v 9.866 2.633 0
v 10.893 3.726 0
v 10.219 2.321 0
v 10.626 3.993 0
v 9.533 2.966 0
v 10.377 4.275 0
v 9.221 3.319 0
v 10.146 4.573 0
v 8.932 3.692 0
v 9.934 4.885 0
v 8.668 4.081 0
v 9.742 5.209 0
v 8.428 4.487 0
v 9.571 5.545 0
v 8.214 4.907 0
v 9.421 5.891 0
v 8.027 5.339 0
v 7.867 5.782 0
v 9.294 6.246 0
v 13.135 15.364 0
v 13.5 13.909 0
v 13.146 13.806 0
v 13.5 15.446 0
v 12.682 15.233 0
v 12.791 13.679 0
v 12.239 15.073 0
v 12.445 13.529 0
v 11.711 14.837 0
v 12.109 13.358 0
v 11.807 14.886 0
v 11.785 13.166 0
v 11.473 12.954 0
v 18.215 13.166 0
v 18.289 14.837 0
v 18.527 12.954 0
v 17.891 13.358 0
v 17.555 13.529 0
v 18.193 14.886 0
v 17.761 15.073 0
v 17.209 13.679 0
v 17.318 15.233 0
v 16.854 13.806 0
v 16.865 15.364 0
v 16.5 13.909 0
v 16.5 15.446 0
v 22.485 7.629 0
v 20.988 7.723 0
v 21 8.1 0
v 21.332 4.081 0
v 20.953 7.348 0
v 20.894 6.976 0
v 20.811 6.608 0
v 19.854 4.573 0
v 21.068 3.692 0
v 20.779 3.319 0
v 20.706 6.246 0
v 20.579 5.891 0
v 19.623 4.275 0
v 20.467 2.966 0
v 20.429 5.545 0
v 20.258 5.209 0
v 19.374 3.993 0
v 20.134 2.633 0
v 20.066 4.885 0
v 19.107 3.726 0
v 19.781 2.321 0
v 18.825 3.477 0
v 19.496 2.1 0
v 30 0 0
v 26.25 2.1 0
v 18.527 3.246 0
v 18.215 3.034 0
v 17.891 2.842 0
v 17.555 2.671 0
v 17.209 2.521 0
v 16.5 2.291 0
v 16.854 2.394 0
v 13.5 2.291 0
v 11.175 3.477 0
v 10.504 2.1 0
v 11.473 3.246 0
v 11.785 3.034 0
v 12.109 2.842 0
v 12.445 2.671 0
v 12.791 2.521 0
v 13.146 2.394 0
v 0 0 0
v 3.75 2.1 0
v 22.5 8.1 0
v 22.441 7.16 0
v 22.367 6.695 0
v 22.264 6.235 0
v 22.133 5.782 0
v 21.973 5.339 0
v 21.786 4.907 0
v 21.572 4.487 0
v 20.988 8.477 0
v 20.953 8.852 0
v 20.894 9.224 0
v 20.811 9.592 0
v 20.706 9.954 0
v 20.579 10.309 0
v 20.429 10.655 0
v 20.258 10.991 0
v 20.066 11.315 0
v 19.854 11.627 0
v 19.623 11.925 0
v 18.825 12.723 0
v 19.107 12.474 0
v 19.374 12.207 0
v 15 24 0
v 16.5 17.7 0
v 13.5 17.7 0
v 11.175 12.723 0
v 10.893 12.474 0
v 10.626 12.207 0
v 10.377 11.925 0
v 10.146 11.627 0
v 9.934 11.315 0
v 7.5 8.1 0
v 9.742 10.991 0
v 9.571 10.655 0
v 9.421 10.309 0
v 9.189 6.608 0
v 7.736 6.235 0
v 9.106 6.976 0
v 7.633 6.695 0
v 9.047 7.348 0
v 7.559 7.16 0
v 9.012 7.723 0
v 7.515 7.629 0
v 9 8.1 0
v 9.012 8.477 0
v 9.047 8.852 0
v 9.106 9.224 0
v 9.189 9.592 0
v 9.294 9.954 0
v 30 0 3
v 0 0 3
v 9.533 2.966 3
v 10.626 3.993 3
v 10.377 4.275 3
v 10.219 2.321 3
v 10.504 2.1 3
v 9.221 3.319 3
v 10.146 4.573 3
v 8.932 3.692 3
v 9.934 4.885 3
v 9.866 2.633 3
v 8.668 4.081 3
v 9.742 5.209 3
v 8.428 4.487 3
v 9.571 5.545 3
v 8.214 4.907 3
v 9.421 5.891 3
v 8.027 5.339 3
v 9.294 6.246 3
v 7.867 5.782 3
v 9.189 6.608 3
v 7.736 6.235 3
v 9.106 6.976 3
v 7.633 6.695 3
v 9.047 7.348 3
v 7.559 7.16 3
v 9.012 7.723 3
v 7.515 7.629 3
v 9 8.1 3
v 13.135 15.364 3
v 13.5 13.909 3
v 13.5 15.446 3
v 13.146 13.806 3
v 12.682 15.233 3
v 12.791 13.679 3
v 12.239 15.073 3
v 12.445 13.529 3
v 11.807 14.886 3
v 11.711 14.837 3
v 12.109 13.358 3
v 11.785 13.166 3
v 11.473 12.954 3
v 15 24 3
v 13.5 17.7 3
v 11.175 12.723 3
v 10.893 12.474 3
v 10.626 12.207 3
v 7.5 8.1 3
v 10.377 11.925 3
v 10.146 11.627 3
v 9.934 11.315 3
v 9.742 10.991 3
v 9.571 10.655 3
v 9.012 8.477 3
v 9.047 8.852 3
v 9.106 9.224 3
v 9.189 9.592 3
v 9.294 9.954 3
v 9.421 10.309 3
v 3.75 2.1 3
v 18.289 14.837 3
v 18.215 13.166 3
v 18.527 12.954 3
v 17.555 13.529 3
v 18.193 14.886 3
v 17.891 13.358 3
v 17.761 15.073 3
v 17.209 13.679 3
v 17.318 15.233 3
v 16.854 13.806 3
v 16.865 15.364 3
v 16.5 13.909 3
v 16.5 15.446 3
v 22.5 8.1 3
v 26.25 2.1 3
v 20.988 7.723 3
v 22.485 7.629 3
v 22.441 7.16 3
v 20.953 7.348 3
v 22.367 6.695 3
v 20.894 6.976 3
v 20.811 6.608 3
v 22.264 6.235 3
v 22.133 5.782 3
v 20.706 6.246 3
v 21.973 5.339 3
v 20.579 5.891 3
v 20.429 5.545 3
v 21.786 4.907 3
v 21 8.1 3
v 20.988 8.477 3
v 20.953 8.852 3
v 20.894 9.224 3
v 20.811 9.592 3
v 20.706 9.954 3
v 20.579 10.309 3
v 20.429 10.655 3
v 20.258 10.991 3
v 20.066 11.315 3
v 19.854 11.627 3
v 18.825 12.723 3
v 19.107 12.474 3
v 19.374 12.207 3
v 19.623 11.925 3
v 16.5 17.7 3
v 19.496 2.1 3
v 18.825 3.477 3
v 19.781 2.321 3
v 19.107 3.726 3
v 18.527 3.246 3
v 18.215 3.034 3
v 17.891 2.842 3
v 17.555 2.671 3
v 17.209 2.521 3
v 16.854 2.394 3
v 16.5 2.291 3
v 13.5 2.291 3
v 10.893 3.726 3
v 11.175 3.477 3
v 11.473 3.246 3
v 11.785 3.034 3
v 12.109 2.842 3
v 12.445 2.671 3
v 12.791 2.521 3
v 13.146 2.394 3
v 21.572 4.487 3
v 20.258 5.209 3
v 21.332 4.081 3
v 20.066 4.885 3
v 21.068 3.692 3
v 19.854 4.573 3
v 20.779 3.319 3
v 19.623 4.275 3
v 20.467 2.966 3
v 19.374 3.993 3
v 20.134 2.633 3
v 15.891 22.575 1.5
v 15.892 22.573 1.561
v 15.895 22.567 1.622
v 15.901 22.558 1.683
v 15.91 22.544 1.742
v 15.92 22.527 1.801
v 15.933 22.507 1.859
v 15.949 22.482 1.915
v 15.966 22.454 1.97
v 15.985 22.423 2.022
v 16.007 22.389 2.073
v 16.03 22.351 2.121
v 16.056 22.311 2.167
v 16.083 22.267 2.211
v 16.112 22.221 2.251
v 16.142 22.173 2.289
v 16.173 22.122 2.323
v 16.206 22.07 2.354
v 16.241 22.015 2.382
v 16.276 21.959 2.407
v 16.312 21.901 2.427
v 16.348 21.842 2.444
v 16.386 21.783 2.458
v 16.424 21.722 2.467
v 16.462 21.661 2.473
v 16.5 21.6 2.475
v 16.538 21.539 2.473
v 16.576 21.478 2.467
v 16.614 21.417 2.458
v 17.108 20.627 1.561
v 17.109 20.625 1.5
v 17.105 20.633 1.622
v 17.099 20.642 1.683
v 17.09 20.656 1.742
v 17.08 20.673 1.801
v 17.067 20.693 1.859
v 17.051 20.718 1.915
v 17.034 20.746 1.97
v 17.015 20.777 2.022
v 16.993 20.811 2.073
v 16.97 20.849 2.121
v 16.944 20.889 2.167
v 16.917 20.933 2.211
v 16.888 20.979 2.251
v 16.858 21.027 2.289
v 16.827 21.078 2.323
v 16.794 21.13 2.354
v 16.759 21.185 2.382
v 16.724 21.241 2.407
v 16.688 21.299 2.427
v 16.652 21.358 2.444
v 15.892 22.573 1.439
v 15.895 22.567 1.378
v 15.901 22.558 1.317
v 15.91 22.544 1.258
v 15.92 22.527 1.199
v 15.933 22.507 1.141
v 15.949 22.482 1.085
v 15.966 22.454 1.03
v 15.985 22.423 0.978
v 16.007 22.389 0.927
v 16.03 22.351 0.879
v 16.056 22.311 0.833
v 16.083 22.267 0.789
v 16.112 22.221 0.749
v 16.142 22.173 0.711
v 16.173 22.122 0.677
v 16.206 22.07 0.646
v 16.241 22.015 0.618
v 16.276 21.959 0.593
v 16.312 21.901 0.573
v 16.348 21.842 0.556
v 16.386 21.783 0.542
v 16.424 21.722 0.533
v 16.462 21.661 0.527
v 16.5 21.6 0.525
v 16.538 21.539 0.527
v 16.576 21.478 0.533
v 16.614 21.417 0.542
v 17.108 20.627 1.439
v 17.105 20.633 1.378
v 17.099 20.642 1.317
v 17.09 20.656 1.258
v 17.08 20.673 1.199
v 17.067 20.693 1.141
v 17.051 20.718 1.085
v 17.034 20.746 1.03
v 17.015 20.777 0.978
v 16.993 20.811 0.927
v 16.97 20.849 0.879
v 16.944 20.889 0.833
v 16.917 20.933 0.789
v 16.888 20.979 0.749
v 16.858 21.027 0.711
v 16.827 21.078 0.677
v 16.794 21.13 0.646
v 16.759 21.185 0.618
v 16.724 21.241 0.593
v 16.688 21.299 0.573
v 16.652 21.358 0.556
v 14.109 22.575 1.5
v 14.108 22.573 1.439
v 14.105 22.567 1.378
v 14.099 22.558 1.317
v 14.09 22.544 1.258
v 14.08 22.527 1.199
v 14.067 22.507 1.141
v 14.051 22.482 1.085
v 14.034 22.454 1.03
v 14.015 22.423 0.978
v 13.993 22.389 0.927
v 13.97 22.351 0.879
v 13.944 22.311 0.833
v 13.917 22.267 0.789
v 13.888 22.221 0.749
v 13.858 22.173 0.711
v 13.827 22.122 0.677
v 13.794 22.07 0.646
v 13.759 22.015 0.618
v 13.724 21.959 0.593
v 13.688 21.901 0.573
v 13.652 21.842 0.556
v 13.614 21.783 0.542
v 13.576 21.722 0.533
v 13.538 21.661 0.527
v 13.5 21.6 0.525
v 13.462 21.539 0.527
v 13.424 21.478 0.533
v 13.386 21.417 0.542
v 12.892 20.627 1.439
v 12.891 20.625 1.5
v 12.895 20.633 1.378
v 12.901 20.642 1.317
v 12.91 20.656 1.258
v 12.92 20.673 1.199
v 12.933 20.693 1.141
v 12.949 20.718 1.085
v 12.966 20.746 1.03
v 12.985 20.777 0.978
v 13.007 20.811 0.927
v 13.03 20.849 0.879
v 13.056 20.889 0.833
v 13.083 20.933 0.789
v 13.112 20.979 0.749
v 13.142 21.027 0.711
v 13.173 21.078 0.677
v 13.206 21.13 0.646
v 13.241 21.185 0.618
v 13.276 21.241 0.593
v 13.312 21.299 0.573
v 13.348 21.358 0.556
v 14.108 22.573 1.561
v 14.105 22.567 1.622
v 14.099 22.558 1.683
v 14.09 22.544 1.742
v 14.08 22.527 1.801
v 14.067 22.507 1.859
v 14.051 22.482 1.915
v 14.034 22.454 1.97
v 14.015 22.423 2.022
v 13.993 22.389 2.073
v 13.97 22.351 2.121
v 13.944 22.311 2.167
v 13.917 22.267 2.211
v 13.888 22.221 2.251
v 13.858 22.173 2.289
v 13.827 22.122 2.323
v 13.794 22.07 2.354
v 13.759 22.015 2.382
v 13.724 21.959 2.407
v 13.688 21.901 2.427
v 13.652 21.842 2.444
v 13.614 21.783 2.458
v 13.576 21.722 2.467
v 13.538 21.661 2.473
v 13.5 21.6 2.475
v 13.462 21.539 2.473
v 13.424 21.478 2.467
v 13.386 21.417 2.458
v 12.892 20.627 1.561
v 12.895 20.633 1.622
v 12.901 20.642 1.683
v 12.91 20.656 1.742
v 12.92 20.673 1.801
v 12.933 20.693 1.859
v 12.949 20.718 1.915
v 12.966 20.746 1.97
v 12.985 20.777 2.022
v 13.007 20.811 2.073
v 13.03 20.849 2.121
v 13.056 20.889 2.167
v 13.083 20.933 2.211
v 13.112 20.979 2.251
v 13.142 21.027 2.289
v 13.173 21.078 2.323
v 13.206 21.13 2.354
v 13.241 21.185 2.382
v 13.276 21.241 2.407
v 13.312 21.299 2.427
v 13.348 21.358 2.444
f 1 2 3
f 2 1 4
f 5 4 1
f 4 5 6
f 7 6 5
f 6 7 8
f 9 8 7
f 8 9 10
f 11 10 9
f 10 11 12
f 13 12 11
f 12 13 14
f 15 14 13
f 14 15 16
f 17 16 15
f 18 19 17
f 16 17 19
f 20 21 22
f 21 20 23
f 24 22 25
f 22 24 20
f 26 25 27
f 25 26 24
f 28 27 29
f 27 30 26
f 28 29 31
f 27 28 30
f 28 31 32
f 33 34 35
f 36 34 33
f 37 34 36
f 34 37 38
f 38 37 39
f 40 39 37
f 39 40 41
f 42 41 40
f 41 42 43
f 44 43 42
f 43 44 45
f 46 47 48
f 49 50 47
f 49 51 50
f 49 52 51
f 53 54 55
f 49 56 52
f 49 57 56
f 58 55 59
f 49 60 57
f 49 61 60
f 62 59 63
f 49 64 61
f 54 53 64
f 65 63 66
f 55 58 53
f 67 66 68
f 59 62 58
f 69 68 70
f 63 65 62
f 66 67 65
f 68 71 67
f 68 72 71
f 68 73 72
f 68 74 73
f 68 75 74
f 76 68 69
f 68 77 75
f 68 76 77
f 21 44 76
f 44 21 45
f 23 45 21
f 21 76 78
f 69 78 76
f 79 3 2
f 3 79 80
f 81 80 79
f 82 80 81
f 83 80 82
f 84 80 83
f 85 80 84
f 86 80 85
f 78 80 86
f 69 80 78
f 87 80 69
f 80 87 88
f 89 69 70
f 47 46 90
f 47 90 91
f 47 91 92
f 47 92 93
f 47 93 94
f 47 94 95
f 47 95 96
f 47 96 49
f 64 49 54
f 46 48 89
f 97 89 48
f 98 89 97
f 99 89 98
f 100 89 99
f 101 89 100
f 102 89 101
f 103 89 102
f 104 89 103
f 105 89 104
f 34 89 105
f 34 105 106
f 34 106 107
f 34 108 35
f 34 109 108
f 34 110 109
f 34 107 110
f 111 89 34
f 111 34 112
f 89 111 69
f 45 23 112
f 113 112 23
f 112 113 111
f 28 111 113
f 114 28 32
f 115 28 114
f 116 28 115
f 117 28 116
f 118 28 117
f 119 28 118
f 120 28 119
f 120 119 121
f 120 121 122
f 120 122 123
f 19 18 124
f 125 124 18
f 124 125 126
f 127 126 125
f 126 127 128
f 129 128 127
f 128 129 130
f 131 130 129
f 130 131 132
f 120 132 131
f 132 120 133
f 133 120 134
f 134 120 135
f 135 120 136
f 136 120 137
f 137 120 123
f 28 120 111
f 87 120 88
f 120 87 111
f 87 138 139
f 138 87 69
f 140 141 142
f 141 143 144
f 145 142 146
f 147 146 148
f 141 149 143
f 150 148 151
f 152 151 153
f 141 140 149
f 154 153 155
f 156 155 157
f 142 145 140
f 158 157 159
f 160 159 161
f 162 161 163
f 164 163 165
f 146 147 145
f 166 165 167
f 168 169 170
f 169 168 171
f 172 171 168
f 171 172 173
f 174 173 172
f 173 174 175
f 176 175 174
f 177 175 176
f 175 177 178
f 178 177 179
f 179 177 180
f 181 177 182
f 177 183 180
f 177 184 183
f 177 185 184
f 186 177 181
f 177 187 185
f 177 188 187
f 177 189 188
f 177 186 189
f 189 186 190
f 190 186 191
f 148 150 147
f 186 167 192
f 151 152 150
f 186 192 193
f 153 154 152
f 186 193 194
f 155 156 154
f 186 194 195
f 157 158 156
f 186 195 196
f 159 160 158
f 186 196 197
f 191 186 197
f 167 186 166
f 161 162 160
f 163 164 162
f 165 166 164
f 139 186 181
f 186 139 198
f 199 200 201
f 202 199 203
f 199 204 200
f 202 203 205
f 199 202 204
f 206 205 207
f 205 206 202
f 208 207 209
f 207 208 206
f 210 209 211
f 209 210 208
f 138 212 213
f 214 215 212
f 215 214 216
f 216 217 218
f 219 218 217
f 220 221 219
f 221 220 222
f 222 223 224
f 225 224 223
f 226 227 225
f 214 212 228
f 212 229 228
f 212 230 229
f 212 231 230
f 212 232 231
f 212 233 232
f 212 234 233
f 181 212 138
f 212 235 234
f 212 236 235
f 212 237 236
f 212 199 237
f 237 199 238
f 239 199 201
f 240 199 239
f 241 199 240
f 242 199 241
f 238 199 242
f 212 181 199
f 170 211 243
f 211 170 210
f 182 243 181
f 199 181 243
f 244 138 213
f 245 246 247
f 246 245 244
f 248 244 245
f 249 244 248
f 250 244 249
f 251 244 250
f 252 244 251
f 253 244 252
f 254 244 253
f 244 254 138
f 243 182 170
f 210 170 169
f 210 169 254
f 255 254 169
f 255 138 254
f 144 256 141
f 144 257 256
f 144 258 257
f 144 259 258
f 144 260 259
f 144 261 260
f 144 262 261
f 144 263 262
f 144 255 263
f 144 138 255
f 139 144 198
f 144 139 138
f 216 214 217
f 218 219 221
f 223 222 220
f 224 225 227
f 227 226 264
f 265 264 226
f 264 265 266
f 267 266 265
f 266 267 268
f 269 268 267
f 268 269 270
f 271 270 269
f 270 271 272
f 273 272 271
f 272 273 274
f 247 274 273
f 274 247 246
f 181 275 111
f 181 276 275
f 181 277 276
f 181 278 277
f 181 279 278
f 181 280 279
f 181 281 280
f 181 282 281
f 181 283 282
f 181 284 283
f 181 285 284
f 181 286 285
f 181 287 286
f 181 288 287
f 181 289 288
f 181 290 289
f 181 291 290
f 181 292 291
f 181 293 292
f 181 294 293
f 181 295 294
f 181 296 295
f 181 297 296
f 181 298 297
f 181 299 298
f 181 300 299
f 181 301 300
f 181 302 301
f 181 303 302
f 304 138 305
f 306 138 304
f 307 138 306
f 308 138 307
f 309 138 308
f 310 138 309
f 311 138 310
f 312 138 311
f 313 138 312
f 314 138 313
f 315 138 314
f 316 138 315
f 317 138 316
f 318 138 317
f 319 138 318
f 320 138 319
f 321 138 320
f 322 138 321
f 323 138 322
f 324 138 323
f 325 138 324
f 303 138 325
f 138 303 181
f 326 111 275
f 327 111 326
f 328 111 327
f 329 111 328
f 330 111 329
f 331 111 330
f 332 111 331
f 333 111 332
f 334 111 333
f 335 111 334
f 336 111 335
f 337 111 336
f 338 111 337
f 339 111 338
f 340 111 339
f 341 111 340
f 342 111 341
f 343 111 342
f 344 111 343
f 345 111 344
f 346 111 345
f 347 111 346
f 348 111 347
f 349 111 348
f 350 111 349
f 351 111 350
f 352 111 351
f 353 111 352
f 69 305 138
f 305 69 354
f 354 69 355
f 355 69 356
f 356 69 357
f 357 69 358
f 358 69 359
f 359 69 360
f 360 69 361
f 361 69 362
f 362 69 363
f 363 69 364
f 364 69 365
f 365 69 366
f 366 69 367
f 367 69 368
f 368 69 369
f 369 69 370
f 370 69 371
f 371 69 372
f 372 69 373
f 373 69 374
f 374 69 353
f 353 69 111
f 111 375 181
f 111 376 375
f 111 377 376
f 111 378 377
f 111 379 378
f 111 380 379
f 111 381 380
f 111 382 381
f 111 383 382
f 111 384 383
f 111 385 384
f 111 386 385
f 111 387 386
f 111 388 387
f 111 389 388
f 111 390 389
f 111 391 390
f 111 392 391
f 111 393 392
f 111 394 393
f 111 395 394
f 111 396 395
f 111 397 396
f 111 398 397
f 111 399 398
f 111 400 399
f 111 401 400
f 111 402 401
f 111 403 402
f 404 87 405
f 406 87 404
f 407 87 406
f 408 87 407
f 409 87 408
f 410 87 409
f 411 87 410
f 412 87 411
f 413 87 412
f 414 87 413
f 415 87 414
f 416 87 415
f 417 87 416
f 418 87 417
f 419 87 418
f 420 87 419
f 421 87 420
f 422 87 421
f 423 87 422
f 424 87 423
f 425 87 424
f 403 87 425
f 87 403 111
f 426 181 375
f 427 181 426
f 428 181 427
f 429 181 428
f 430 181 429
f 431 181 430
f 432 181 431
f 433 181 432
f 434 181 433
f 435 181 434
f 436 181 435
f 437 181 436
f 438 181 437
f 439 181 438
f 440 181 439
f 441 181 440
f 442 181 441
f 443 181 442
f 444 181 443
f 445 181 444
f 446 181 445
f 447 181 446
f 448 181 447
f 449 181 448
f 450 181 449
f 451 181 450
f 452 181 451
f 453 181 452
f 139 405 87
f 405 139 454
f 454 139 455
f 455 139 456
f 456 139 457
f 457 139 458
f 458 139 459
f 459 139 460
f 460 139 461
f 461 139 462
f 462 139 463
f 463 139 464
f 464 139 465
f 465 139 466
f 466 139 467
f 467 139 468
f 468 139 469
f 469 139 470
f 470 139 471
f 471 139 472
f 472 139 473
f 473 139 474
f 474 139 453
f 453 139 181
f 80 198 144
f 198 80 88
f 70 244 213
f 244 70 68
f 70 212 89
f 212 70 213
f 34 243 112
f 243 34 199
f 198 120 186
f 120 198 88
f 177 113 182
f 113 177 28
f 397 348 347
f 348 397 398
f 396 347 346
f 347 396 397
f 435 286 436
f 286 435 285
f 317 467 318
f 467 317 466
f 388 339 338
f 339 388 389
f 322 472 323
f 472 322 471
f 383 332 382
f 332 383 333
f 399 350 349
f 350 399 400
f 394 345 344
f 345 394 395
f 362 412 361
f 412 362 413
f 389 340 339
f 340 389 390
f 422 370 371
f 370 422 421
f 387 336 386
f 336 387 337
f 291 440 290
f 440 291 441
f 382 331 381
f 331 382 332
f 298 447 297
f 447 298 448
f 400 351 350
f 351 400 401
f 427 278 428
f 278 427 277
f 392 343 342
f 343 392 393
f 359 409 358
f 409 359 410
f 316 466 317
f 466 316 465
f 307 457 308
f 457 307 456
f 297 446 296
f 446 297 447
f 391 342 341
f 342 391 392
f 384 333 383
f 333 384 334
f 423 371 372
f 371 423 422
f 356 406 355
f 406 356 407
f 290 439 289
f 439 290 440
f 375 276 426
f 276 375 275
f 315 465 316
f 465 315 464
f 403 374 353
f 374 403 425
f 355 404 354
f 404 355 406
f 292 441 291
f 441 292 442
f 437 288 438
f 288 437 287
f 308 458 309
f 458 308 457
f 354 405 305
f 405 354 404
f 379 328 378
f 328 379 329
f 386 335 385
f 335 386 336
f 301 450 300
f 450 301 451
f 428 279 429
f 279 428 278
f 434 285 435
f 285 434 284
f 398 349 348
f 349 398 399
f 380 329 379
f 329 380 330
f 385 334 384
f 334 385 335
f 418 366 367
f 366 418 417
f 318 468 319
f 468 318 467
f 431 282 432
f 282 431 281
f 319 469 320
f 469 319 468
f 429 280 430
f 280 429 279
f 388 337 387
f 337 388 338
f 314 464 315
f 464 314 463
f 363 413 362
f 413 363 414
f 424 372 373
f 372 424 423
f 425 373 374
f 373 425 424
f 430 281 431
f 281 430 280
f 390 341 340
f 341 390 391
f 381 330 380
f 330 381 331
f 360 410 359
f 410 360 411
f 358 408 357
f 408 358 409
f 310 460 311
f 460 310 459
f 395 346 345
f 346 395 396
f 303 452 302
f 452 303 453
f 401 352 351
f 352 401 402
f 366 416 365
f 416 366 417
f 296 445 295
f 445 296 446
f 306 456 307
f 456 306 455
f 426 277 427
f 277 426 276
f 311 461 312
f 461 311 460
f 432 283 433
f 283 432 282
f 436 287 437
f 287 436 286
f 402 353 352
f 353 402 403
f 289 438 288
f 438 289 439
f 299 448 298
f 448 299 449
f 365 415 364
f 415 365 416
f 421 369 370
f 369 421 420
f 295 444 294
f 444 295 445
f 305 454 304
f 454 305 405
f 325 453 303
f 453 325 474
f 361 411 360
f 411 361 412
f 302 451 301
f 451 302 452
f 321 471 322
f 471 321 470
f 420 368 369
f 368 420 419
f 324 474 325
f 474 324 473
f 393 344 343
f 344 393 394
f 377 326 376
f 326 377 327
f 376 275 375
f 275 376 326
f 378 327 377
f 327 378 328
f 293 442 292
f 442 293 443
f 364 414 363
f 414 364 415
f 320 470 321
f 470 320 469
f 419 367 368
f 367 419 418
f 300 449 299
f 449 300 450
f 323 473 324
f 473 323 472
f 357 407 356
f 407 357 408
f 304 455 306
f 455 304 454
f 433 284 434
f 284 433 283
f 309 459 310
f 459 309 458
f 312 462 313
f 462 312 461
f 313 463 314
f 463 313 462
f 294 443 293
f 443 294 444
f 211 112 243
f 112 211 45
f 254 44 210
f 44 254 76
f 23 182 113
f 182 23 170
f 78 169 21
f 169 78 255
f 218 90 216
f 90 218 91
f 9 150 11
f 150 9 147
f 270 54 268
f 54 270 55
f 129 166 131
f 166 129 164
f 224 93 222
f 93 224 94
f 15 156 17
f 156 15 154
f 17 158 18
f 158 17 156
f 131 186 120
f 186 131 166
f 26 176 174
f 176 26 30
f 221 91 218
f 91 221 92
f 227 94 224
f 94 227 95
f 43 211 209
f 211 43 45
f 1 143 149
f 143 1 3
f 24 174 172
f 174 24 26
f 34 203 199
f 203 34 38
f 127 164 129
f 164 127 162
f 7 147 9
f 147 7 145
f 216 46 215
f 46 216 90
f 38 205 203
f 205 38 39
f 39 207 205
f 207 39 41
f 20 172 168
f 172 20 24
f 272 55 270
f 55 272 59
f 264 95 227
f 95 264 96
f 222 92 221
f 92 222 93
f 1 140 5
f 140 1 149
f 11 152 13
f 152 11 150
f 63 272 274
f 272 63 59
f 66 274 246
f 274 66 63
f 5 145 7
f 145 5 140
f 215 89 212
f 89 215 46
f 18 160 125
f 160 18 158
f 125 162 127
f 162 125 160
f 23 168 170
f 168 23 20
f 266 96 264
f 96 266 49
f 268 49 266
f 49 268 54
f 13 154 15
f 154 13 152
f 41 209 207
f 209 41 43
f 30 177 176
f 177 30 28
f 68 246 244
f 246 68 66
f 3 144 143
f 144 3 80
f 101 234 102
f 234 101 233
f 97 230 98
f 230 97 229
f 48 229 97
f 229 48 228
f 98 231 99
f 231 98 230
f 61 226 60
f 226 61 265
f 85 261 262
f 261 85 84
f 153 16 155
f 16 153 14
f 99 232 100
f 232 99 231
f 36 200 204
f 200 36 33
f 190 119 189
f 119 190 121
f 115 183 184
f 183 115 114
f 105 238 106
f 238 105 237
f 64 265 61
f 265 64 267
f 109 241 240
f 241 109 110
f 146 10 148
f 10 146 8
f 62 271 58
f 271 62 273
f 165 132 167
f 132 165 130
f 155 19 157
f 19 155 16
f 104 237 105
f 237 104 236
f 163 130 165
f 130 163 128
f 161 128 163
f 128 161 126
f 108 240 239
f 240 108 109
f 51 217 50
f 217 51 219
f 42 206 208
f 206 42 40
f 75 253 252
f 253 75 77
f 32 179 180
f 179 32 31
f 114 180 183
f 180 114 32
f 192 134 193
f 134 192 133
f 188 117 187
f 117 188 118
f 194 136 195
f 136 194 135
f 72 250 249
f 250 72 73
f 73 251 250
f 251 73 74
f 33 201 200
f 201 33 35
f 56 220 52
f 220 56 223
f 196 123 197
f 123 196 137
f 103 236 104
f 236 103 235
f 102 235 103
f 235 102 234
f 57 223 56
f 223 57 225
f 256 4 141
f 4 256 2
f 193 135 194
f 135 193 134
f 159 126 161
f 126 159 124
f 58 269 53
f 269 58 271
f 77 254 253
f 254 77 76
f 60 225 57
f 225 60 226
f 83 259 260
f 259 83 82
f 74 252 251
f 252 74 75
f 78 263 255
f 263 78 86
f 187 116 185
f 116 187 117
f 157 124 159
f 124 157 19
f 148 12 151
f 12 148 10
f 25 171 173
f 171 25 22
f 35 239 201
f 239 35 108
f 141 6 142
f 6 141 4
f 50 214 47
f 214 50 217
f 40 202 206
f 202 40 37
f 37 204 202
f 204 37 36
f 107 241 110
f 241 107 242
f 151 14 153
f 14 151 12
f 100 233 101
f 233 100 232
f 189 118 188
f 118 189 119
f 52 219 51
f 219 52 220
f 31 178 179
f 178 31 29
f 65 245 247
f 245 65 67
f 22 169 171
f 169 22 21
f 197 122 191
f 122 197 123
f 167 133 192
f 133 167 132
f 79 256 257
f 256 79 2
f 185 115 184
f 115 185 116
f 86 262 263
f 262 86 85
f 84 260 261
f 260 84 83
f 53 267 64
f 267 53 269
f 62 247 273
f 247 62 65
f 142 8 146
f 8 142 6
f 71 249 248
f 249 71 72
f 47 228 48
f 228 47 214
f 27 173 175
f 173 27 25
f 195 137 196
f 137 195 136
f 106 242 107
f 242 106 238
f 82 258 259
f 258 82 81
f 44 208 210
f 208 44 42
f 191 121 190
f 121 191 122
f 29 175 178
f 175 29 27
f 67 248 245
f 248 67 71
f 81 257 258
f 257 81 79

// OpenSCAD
/*
Deathly Hallows Pendant
by Corrinne Casey
Note: this is meant to be put on a string and worn. Please scale appropriately.
*/
module Hallows(){
$fn = 100;

triside = 20;
tridiff = .75;
stickwidth = 2;
thickness = 2;
holesize = 1.3;
insidetrimove = [.125*triside,.07*triside,0];
//insidetrimove = [2.5*size,1.4*size,0];

difference(){
difference(){
linear_extrude(thickness){polygon([[0,0],[triside,0],[(triside/2),triside*.8]]);}
translate(insidetrimove){linear_extrude((thickness+1)){polygon([[0,0],[triside*tridiff,0],[(triside/2)*tridiff,(triside*.8)*tridiff]]);}}}
rotate([0,90,0]){translate([(-thickness*.5),(triside*.72),0]){cylinder(d=holesize,h=12);}}}
difference(){
translate([(triside*.45),0,0]){
    cube([stickwidth,(triside*.72),thickness]);}
rotate([0,90,0]){translate([(-thickness*.5),(triside*.72),0]){cylinder(d=holesize,h=12);}}}
translate([(triside*.5),(triside*.27),0]){
difference(){
cylinder(d=(triside*.5),h=thickness);
    cylinder(d=(triside*.4),h=thickness);}}}
scale([1.5,1.5,1.5]){
    Hallows();
}
